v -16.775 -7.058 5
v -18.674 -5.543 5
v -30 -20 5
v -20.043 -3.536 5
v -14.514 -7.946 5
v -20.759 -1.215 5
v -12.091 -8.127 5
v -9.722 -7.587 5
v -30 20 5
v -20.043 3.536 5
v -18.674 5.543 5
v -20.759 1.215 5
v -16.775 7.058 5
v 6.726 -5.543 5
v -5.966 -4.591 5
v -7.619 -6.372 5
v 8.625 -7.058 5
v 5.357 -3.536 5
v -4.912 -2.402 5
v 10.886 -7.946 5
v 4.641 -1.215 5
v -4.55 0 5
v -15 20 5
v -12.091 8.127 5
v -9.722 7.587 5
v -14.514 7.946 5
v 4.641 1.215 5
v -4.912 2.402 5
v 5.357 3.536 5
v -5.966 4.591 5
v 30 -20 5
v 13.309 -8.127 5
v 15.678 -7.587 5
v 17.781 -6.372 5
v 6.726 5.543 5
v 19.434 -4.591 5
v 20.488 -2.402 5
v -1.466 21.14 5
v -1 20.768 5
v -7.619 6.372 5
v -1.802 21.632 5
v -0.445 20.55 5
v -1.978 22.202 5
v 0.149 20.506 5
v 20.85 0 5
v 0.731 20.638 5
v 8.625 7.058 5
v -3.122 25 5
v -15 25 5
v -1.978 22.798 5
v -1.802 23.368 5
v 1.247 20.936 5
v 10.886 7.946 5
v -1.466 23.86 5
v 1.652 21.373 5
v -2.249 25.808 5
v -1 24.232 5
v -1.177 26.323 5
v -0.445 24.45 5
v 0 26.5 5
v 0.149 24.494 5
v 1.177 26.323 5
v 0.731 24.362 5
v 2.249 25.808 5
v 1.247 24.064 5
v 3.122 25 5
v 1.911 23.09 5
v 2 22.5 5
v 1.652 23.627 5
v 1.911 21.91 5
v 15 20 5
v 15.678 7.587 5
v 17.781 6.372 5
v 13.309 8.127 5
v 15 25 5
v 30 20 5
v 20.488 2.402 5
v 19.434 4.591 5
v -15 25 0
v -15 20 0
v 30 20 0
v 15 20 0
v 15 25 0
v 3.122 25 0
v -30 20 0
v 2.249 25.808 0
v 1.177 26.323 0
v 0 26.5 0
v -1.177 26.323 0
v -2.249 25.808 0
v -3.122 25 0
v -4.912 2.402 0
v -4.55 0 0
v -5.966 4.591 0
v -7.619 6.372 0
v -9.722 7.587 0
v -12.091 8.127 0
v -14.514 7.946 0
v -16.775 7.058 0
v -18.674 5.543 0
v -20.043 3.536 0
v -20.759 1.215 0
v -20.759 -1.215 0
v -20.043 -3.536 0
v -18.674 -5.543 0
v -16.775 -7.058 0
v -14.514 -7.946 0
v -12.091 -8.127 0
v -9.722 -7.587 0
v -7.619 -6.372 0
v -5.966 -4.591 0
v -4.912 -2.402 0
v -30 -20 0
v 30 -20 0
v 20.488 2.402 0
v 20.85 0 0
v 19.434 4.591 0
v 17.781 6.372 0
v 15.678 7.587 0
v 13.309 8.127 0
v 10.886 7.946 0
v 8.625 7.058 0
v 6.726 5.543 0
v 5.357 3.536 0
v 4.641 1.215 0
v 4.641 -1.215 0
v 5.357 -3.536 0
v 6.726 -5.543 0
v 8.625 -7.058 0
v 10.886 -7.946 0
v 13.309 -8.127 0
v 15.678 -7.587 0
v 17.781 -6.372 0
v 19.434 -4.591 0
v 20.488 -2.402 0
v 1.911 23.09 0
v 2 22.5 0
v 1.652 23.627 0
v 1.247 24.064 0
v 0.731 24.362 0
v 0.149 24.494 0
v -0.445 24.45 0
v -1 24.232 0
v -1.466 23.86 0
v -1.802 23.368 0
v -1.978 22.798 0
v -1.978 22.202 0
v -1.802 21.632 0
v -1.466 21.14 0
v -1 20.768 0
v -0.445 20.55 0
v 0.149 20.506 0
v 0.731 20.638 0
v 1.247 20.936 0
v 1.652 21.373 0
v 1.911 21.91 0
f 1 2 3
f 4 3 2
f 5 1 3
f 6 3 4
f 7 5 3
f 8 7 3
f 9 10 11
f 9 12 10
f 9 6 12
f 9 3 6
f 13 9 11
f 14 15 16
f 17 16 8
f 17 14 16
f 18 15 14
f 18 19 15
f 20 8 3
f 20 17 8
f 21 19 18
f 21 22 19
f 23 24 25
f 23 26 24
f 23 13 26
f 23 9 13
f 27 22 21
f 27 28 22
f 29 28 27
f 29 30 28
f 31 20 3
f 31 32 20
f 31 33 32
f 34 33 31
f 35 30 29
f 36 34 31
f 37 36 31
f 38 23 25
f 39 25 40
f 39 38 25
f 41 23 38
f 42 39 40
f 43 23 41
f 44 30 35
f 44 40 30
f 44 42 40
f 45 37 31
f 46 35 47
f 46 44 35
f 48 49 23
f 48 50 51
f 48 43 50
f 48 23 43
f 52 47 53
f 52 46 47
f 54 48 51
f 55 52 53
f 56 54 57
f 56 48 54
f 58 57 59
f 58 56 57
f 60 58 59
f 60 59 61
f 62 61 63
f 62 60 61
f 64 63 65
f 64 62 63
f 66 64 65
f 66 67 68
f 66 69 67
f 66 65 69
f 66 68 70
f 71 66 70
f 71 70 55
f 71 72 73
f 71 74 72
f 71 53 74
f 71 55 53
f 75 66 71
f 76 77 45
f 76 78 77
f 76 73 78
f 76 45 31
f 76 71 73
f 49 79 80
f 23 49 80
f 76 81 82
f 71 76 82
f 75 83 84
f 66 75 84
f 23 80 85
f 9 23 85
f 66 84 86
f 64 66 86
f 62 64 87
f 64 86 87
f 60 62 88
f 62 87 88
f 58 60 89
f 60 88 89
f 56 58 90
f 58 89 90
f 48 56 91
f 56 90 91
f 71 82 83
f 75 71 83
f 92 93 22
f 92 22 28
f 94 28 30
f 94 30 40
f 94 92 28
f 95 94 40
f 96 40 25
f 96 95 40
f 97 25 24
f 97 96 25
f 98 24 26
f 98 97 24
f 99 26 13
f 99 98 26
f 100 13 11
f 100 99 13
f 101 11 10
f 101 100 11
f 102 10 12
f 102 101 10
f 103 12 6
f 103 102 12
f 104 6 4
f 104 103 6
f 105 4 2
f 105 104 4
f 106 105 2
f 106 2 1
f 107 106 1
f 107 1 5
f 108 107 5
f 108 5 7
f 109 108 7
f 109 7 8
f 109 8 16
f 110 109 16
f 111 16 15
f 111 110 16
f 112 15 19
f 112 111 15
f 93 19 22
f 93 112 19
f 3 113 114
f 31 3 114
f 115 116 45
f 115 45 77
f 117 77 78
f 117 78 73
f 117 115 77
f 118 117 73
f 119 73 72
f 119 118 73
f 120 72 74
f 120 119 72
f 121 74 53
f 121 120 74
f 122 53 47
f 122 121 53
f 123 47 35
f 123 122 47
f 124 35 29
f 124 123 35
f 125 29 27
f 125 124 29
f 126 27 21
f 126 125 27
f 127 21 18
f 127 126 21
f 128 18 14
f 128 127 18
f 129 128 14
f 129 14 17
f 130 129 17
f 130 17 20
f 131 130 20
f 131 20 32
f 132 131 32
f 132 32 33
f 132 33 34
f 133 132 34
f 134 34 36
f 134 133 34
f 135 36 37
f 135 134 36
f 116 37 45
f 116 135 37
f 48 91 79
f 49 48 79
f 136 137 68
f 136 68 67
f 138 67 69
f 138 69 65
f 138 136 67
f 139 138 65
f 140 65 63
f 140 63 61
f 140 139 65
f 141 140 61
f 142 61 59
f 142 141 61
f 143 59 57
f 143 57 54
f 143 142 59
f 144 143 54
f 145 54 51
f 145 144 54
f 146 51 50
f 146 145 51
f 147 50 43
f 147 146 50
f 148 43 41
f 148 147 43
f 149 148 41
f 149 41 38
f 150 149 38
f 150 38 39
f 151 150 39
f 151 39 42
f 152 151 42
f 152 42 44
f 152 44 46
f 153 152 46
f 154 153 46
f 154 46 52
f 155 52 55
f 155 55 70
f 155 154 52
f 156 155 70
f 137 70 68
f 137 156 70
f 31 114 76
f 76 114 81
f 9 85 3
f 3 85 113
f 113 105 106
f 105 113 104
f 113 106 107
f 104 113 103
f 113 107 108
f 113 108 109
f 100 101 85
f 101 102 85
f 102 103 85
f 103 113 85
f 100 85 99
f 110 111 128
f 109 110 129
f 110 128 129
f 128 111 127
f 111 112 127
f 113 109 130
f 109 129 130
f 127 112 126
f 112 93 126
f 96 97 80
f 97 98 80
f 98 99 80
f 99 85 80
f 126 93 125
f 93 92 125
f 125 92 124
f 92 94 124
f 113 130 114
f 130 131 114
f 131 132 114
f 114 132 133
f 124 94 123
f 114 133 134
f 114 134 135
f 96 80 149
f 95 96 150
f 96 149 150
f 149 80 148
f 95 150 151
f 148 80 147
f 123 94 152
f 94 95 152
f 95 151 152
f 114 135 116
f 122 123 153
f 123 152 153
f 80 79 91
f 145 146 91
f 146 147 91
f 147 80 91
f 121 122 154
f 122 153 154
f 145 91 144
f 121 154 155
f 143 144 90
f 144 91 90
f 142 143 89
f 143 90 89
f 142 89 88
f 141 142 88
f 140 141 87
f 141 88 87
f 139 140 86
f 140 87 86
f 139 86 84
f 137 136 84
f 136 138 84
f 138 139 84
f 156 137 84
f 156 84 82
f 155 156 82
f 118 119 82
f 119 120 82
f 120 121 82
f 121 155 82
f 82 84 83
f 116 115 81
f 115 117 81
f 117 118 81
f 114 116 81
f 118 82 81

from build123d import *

# Parameters (mm, degrees)
ESQUISSE1_R        = 8.15
ESQUISSE1_R_2      = 2
BOSS_EXTRU_1_DEPTH = 5


with BuildPart() as part:
    # Esquisse1 → Boss.-Extru.1 (new body)
    # profile 1 of 7: a face of its own
    with BuildSketch(Plane.XY):
        Polygon((-30, 20), (-30, -20), (30, -20), (30, 20), (15, 20), (15, 15), (-15, 15), (-15, 20), align=None)
        with Locations((-12.7, 0)):
            Circle(ESQUISSE1_R, mode=Mode.SUBTRACT)
        with Locations((12.7, 0)):
            Circle(ESQUISSE1_R, mode=Mode.SUBTRACT)
    # profile 2 of 7: a face of its own
    with BuildSketch(Plane.XY):
        with BuildLine():
            Line((-3.122498999, 20), (-15, 20))
            Line((-15, 20), (-15, 15))
            Line((-15, 15), (15, 15))
            Line((15, 15), (15, 20))
            Line((15, 20), (3.122498999, 20))
            ThreePointArc((3.122498999, 20), (0, 18.5), (-3.122498999, 20))
        make_face()
    # profile 3 of 7: a face of its own
    with BuildSketch(Plane.XY):
        with BuildLine():
            Line((-15, 25), (-15, 20))
            Line((-15, 20), (-3.122498999, 20))
            ThreePointArc((-3.122498999, 20), (-4, 22.5), (-3.122498999, 25))
            Line((-3.122498999, 25), (-15, 25))
        make_face()
    # profile 4 of 7: a face of its own
    with BuildSketch(Plane.XY):
        with BuildLine():
            Line((3.122498999, 20), (15, 20))
            Line((15, 20), (15, 25))
            Line((15, 25), (3.122498999, 25))
            ThreePointArc((3.122498999, 25), (3.774254628, 23.824764885), (4, 22.5))
            ThreePointArc((4, 22.5), (3.774254628, 21.175235115), (3.122498999, 20))
        make_face()
    # profile 5 of 7: a face of its own
    with BuildSketch(Plane.XY):
        with BuildLine():
            Line((3.122498999, 20), (-3.122498999, 20))
            ThreePointArc((-3.122498999, 20), (0, 18.5), (3.122498999, 20))
        make_face()
    # profile 6 of 7: a face of its own
    with BuildSketch(Plane.XY):
        with BuildLine():
            ThreePointArc((-3.122498999, 25), (-4, 22.5), (-3.122498999, 20))
            Line((-3.122498999, 20), (3.122498999, 20))
            ThreePointArc((3.122498999, 20), (3.774254628, 21.175235115), (4, 22.5))
            ThreePointArc((4, 22.5), (3.774254628, 23.824764885), (3.122498999, 25))
            Line((3.122498999, 25), (-3.122498999, 25))
        make_face()
        with Locations((0, 22.5)):
            Circle(ESQUISSE1_R_2, mode=Mode.SUBTRACT)
    # profile 7 of 7: a face of its own
    with BuildSketch(Plane.XY):
        with BuildLine():
            ThreePointArc((3.122498999, 25), (0, 26.5), (-3.122498999, 25))
            Line((-3.122498999, 25), (3.122498999, 25))
        make_face()
    extrude(amount=BOSS_EXTRU_1_DEPTH)


solid = part.part
